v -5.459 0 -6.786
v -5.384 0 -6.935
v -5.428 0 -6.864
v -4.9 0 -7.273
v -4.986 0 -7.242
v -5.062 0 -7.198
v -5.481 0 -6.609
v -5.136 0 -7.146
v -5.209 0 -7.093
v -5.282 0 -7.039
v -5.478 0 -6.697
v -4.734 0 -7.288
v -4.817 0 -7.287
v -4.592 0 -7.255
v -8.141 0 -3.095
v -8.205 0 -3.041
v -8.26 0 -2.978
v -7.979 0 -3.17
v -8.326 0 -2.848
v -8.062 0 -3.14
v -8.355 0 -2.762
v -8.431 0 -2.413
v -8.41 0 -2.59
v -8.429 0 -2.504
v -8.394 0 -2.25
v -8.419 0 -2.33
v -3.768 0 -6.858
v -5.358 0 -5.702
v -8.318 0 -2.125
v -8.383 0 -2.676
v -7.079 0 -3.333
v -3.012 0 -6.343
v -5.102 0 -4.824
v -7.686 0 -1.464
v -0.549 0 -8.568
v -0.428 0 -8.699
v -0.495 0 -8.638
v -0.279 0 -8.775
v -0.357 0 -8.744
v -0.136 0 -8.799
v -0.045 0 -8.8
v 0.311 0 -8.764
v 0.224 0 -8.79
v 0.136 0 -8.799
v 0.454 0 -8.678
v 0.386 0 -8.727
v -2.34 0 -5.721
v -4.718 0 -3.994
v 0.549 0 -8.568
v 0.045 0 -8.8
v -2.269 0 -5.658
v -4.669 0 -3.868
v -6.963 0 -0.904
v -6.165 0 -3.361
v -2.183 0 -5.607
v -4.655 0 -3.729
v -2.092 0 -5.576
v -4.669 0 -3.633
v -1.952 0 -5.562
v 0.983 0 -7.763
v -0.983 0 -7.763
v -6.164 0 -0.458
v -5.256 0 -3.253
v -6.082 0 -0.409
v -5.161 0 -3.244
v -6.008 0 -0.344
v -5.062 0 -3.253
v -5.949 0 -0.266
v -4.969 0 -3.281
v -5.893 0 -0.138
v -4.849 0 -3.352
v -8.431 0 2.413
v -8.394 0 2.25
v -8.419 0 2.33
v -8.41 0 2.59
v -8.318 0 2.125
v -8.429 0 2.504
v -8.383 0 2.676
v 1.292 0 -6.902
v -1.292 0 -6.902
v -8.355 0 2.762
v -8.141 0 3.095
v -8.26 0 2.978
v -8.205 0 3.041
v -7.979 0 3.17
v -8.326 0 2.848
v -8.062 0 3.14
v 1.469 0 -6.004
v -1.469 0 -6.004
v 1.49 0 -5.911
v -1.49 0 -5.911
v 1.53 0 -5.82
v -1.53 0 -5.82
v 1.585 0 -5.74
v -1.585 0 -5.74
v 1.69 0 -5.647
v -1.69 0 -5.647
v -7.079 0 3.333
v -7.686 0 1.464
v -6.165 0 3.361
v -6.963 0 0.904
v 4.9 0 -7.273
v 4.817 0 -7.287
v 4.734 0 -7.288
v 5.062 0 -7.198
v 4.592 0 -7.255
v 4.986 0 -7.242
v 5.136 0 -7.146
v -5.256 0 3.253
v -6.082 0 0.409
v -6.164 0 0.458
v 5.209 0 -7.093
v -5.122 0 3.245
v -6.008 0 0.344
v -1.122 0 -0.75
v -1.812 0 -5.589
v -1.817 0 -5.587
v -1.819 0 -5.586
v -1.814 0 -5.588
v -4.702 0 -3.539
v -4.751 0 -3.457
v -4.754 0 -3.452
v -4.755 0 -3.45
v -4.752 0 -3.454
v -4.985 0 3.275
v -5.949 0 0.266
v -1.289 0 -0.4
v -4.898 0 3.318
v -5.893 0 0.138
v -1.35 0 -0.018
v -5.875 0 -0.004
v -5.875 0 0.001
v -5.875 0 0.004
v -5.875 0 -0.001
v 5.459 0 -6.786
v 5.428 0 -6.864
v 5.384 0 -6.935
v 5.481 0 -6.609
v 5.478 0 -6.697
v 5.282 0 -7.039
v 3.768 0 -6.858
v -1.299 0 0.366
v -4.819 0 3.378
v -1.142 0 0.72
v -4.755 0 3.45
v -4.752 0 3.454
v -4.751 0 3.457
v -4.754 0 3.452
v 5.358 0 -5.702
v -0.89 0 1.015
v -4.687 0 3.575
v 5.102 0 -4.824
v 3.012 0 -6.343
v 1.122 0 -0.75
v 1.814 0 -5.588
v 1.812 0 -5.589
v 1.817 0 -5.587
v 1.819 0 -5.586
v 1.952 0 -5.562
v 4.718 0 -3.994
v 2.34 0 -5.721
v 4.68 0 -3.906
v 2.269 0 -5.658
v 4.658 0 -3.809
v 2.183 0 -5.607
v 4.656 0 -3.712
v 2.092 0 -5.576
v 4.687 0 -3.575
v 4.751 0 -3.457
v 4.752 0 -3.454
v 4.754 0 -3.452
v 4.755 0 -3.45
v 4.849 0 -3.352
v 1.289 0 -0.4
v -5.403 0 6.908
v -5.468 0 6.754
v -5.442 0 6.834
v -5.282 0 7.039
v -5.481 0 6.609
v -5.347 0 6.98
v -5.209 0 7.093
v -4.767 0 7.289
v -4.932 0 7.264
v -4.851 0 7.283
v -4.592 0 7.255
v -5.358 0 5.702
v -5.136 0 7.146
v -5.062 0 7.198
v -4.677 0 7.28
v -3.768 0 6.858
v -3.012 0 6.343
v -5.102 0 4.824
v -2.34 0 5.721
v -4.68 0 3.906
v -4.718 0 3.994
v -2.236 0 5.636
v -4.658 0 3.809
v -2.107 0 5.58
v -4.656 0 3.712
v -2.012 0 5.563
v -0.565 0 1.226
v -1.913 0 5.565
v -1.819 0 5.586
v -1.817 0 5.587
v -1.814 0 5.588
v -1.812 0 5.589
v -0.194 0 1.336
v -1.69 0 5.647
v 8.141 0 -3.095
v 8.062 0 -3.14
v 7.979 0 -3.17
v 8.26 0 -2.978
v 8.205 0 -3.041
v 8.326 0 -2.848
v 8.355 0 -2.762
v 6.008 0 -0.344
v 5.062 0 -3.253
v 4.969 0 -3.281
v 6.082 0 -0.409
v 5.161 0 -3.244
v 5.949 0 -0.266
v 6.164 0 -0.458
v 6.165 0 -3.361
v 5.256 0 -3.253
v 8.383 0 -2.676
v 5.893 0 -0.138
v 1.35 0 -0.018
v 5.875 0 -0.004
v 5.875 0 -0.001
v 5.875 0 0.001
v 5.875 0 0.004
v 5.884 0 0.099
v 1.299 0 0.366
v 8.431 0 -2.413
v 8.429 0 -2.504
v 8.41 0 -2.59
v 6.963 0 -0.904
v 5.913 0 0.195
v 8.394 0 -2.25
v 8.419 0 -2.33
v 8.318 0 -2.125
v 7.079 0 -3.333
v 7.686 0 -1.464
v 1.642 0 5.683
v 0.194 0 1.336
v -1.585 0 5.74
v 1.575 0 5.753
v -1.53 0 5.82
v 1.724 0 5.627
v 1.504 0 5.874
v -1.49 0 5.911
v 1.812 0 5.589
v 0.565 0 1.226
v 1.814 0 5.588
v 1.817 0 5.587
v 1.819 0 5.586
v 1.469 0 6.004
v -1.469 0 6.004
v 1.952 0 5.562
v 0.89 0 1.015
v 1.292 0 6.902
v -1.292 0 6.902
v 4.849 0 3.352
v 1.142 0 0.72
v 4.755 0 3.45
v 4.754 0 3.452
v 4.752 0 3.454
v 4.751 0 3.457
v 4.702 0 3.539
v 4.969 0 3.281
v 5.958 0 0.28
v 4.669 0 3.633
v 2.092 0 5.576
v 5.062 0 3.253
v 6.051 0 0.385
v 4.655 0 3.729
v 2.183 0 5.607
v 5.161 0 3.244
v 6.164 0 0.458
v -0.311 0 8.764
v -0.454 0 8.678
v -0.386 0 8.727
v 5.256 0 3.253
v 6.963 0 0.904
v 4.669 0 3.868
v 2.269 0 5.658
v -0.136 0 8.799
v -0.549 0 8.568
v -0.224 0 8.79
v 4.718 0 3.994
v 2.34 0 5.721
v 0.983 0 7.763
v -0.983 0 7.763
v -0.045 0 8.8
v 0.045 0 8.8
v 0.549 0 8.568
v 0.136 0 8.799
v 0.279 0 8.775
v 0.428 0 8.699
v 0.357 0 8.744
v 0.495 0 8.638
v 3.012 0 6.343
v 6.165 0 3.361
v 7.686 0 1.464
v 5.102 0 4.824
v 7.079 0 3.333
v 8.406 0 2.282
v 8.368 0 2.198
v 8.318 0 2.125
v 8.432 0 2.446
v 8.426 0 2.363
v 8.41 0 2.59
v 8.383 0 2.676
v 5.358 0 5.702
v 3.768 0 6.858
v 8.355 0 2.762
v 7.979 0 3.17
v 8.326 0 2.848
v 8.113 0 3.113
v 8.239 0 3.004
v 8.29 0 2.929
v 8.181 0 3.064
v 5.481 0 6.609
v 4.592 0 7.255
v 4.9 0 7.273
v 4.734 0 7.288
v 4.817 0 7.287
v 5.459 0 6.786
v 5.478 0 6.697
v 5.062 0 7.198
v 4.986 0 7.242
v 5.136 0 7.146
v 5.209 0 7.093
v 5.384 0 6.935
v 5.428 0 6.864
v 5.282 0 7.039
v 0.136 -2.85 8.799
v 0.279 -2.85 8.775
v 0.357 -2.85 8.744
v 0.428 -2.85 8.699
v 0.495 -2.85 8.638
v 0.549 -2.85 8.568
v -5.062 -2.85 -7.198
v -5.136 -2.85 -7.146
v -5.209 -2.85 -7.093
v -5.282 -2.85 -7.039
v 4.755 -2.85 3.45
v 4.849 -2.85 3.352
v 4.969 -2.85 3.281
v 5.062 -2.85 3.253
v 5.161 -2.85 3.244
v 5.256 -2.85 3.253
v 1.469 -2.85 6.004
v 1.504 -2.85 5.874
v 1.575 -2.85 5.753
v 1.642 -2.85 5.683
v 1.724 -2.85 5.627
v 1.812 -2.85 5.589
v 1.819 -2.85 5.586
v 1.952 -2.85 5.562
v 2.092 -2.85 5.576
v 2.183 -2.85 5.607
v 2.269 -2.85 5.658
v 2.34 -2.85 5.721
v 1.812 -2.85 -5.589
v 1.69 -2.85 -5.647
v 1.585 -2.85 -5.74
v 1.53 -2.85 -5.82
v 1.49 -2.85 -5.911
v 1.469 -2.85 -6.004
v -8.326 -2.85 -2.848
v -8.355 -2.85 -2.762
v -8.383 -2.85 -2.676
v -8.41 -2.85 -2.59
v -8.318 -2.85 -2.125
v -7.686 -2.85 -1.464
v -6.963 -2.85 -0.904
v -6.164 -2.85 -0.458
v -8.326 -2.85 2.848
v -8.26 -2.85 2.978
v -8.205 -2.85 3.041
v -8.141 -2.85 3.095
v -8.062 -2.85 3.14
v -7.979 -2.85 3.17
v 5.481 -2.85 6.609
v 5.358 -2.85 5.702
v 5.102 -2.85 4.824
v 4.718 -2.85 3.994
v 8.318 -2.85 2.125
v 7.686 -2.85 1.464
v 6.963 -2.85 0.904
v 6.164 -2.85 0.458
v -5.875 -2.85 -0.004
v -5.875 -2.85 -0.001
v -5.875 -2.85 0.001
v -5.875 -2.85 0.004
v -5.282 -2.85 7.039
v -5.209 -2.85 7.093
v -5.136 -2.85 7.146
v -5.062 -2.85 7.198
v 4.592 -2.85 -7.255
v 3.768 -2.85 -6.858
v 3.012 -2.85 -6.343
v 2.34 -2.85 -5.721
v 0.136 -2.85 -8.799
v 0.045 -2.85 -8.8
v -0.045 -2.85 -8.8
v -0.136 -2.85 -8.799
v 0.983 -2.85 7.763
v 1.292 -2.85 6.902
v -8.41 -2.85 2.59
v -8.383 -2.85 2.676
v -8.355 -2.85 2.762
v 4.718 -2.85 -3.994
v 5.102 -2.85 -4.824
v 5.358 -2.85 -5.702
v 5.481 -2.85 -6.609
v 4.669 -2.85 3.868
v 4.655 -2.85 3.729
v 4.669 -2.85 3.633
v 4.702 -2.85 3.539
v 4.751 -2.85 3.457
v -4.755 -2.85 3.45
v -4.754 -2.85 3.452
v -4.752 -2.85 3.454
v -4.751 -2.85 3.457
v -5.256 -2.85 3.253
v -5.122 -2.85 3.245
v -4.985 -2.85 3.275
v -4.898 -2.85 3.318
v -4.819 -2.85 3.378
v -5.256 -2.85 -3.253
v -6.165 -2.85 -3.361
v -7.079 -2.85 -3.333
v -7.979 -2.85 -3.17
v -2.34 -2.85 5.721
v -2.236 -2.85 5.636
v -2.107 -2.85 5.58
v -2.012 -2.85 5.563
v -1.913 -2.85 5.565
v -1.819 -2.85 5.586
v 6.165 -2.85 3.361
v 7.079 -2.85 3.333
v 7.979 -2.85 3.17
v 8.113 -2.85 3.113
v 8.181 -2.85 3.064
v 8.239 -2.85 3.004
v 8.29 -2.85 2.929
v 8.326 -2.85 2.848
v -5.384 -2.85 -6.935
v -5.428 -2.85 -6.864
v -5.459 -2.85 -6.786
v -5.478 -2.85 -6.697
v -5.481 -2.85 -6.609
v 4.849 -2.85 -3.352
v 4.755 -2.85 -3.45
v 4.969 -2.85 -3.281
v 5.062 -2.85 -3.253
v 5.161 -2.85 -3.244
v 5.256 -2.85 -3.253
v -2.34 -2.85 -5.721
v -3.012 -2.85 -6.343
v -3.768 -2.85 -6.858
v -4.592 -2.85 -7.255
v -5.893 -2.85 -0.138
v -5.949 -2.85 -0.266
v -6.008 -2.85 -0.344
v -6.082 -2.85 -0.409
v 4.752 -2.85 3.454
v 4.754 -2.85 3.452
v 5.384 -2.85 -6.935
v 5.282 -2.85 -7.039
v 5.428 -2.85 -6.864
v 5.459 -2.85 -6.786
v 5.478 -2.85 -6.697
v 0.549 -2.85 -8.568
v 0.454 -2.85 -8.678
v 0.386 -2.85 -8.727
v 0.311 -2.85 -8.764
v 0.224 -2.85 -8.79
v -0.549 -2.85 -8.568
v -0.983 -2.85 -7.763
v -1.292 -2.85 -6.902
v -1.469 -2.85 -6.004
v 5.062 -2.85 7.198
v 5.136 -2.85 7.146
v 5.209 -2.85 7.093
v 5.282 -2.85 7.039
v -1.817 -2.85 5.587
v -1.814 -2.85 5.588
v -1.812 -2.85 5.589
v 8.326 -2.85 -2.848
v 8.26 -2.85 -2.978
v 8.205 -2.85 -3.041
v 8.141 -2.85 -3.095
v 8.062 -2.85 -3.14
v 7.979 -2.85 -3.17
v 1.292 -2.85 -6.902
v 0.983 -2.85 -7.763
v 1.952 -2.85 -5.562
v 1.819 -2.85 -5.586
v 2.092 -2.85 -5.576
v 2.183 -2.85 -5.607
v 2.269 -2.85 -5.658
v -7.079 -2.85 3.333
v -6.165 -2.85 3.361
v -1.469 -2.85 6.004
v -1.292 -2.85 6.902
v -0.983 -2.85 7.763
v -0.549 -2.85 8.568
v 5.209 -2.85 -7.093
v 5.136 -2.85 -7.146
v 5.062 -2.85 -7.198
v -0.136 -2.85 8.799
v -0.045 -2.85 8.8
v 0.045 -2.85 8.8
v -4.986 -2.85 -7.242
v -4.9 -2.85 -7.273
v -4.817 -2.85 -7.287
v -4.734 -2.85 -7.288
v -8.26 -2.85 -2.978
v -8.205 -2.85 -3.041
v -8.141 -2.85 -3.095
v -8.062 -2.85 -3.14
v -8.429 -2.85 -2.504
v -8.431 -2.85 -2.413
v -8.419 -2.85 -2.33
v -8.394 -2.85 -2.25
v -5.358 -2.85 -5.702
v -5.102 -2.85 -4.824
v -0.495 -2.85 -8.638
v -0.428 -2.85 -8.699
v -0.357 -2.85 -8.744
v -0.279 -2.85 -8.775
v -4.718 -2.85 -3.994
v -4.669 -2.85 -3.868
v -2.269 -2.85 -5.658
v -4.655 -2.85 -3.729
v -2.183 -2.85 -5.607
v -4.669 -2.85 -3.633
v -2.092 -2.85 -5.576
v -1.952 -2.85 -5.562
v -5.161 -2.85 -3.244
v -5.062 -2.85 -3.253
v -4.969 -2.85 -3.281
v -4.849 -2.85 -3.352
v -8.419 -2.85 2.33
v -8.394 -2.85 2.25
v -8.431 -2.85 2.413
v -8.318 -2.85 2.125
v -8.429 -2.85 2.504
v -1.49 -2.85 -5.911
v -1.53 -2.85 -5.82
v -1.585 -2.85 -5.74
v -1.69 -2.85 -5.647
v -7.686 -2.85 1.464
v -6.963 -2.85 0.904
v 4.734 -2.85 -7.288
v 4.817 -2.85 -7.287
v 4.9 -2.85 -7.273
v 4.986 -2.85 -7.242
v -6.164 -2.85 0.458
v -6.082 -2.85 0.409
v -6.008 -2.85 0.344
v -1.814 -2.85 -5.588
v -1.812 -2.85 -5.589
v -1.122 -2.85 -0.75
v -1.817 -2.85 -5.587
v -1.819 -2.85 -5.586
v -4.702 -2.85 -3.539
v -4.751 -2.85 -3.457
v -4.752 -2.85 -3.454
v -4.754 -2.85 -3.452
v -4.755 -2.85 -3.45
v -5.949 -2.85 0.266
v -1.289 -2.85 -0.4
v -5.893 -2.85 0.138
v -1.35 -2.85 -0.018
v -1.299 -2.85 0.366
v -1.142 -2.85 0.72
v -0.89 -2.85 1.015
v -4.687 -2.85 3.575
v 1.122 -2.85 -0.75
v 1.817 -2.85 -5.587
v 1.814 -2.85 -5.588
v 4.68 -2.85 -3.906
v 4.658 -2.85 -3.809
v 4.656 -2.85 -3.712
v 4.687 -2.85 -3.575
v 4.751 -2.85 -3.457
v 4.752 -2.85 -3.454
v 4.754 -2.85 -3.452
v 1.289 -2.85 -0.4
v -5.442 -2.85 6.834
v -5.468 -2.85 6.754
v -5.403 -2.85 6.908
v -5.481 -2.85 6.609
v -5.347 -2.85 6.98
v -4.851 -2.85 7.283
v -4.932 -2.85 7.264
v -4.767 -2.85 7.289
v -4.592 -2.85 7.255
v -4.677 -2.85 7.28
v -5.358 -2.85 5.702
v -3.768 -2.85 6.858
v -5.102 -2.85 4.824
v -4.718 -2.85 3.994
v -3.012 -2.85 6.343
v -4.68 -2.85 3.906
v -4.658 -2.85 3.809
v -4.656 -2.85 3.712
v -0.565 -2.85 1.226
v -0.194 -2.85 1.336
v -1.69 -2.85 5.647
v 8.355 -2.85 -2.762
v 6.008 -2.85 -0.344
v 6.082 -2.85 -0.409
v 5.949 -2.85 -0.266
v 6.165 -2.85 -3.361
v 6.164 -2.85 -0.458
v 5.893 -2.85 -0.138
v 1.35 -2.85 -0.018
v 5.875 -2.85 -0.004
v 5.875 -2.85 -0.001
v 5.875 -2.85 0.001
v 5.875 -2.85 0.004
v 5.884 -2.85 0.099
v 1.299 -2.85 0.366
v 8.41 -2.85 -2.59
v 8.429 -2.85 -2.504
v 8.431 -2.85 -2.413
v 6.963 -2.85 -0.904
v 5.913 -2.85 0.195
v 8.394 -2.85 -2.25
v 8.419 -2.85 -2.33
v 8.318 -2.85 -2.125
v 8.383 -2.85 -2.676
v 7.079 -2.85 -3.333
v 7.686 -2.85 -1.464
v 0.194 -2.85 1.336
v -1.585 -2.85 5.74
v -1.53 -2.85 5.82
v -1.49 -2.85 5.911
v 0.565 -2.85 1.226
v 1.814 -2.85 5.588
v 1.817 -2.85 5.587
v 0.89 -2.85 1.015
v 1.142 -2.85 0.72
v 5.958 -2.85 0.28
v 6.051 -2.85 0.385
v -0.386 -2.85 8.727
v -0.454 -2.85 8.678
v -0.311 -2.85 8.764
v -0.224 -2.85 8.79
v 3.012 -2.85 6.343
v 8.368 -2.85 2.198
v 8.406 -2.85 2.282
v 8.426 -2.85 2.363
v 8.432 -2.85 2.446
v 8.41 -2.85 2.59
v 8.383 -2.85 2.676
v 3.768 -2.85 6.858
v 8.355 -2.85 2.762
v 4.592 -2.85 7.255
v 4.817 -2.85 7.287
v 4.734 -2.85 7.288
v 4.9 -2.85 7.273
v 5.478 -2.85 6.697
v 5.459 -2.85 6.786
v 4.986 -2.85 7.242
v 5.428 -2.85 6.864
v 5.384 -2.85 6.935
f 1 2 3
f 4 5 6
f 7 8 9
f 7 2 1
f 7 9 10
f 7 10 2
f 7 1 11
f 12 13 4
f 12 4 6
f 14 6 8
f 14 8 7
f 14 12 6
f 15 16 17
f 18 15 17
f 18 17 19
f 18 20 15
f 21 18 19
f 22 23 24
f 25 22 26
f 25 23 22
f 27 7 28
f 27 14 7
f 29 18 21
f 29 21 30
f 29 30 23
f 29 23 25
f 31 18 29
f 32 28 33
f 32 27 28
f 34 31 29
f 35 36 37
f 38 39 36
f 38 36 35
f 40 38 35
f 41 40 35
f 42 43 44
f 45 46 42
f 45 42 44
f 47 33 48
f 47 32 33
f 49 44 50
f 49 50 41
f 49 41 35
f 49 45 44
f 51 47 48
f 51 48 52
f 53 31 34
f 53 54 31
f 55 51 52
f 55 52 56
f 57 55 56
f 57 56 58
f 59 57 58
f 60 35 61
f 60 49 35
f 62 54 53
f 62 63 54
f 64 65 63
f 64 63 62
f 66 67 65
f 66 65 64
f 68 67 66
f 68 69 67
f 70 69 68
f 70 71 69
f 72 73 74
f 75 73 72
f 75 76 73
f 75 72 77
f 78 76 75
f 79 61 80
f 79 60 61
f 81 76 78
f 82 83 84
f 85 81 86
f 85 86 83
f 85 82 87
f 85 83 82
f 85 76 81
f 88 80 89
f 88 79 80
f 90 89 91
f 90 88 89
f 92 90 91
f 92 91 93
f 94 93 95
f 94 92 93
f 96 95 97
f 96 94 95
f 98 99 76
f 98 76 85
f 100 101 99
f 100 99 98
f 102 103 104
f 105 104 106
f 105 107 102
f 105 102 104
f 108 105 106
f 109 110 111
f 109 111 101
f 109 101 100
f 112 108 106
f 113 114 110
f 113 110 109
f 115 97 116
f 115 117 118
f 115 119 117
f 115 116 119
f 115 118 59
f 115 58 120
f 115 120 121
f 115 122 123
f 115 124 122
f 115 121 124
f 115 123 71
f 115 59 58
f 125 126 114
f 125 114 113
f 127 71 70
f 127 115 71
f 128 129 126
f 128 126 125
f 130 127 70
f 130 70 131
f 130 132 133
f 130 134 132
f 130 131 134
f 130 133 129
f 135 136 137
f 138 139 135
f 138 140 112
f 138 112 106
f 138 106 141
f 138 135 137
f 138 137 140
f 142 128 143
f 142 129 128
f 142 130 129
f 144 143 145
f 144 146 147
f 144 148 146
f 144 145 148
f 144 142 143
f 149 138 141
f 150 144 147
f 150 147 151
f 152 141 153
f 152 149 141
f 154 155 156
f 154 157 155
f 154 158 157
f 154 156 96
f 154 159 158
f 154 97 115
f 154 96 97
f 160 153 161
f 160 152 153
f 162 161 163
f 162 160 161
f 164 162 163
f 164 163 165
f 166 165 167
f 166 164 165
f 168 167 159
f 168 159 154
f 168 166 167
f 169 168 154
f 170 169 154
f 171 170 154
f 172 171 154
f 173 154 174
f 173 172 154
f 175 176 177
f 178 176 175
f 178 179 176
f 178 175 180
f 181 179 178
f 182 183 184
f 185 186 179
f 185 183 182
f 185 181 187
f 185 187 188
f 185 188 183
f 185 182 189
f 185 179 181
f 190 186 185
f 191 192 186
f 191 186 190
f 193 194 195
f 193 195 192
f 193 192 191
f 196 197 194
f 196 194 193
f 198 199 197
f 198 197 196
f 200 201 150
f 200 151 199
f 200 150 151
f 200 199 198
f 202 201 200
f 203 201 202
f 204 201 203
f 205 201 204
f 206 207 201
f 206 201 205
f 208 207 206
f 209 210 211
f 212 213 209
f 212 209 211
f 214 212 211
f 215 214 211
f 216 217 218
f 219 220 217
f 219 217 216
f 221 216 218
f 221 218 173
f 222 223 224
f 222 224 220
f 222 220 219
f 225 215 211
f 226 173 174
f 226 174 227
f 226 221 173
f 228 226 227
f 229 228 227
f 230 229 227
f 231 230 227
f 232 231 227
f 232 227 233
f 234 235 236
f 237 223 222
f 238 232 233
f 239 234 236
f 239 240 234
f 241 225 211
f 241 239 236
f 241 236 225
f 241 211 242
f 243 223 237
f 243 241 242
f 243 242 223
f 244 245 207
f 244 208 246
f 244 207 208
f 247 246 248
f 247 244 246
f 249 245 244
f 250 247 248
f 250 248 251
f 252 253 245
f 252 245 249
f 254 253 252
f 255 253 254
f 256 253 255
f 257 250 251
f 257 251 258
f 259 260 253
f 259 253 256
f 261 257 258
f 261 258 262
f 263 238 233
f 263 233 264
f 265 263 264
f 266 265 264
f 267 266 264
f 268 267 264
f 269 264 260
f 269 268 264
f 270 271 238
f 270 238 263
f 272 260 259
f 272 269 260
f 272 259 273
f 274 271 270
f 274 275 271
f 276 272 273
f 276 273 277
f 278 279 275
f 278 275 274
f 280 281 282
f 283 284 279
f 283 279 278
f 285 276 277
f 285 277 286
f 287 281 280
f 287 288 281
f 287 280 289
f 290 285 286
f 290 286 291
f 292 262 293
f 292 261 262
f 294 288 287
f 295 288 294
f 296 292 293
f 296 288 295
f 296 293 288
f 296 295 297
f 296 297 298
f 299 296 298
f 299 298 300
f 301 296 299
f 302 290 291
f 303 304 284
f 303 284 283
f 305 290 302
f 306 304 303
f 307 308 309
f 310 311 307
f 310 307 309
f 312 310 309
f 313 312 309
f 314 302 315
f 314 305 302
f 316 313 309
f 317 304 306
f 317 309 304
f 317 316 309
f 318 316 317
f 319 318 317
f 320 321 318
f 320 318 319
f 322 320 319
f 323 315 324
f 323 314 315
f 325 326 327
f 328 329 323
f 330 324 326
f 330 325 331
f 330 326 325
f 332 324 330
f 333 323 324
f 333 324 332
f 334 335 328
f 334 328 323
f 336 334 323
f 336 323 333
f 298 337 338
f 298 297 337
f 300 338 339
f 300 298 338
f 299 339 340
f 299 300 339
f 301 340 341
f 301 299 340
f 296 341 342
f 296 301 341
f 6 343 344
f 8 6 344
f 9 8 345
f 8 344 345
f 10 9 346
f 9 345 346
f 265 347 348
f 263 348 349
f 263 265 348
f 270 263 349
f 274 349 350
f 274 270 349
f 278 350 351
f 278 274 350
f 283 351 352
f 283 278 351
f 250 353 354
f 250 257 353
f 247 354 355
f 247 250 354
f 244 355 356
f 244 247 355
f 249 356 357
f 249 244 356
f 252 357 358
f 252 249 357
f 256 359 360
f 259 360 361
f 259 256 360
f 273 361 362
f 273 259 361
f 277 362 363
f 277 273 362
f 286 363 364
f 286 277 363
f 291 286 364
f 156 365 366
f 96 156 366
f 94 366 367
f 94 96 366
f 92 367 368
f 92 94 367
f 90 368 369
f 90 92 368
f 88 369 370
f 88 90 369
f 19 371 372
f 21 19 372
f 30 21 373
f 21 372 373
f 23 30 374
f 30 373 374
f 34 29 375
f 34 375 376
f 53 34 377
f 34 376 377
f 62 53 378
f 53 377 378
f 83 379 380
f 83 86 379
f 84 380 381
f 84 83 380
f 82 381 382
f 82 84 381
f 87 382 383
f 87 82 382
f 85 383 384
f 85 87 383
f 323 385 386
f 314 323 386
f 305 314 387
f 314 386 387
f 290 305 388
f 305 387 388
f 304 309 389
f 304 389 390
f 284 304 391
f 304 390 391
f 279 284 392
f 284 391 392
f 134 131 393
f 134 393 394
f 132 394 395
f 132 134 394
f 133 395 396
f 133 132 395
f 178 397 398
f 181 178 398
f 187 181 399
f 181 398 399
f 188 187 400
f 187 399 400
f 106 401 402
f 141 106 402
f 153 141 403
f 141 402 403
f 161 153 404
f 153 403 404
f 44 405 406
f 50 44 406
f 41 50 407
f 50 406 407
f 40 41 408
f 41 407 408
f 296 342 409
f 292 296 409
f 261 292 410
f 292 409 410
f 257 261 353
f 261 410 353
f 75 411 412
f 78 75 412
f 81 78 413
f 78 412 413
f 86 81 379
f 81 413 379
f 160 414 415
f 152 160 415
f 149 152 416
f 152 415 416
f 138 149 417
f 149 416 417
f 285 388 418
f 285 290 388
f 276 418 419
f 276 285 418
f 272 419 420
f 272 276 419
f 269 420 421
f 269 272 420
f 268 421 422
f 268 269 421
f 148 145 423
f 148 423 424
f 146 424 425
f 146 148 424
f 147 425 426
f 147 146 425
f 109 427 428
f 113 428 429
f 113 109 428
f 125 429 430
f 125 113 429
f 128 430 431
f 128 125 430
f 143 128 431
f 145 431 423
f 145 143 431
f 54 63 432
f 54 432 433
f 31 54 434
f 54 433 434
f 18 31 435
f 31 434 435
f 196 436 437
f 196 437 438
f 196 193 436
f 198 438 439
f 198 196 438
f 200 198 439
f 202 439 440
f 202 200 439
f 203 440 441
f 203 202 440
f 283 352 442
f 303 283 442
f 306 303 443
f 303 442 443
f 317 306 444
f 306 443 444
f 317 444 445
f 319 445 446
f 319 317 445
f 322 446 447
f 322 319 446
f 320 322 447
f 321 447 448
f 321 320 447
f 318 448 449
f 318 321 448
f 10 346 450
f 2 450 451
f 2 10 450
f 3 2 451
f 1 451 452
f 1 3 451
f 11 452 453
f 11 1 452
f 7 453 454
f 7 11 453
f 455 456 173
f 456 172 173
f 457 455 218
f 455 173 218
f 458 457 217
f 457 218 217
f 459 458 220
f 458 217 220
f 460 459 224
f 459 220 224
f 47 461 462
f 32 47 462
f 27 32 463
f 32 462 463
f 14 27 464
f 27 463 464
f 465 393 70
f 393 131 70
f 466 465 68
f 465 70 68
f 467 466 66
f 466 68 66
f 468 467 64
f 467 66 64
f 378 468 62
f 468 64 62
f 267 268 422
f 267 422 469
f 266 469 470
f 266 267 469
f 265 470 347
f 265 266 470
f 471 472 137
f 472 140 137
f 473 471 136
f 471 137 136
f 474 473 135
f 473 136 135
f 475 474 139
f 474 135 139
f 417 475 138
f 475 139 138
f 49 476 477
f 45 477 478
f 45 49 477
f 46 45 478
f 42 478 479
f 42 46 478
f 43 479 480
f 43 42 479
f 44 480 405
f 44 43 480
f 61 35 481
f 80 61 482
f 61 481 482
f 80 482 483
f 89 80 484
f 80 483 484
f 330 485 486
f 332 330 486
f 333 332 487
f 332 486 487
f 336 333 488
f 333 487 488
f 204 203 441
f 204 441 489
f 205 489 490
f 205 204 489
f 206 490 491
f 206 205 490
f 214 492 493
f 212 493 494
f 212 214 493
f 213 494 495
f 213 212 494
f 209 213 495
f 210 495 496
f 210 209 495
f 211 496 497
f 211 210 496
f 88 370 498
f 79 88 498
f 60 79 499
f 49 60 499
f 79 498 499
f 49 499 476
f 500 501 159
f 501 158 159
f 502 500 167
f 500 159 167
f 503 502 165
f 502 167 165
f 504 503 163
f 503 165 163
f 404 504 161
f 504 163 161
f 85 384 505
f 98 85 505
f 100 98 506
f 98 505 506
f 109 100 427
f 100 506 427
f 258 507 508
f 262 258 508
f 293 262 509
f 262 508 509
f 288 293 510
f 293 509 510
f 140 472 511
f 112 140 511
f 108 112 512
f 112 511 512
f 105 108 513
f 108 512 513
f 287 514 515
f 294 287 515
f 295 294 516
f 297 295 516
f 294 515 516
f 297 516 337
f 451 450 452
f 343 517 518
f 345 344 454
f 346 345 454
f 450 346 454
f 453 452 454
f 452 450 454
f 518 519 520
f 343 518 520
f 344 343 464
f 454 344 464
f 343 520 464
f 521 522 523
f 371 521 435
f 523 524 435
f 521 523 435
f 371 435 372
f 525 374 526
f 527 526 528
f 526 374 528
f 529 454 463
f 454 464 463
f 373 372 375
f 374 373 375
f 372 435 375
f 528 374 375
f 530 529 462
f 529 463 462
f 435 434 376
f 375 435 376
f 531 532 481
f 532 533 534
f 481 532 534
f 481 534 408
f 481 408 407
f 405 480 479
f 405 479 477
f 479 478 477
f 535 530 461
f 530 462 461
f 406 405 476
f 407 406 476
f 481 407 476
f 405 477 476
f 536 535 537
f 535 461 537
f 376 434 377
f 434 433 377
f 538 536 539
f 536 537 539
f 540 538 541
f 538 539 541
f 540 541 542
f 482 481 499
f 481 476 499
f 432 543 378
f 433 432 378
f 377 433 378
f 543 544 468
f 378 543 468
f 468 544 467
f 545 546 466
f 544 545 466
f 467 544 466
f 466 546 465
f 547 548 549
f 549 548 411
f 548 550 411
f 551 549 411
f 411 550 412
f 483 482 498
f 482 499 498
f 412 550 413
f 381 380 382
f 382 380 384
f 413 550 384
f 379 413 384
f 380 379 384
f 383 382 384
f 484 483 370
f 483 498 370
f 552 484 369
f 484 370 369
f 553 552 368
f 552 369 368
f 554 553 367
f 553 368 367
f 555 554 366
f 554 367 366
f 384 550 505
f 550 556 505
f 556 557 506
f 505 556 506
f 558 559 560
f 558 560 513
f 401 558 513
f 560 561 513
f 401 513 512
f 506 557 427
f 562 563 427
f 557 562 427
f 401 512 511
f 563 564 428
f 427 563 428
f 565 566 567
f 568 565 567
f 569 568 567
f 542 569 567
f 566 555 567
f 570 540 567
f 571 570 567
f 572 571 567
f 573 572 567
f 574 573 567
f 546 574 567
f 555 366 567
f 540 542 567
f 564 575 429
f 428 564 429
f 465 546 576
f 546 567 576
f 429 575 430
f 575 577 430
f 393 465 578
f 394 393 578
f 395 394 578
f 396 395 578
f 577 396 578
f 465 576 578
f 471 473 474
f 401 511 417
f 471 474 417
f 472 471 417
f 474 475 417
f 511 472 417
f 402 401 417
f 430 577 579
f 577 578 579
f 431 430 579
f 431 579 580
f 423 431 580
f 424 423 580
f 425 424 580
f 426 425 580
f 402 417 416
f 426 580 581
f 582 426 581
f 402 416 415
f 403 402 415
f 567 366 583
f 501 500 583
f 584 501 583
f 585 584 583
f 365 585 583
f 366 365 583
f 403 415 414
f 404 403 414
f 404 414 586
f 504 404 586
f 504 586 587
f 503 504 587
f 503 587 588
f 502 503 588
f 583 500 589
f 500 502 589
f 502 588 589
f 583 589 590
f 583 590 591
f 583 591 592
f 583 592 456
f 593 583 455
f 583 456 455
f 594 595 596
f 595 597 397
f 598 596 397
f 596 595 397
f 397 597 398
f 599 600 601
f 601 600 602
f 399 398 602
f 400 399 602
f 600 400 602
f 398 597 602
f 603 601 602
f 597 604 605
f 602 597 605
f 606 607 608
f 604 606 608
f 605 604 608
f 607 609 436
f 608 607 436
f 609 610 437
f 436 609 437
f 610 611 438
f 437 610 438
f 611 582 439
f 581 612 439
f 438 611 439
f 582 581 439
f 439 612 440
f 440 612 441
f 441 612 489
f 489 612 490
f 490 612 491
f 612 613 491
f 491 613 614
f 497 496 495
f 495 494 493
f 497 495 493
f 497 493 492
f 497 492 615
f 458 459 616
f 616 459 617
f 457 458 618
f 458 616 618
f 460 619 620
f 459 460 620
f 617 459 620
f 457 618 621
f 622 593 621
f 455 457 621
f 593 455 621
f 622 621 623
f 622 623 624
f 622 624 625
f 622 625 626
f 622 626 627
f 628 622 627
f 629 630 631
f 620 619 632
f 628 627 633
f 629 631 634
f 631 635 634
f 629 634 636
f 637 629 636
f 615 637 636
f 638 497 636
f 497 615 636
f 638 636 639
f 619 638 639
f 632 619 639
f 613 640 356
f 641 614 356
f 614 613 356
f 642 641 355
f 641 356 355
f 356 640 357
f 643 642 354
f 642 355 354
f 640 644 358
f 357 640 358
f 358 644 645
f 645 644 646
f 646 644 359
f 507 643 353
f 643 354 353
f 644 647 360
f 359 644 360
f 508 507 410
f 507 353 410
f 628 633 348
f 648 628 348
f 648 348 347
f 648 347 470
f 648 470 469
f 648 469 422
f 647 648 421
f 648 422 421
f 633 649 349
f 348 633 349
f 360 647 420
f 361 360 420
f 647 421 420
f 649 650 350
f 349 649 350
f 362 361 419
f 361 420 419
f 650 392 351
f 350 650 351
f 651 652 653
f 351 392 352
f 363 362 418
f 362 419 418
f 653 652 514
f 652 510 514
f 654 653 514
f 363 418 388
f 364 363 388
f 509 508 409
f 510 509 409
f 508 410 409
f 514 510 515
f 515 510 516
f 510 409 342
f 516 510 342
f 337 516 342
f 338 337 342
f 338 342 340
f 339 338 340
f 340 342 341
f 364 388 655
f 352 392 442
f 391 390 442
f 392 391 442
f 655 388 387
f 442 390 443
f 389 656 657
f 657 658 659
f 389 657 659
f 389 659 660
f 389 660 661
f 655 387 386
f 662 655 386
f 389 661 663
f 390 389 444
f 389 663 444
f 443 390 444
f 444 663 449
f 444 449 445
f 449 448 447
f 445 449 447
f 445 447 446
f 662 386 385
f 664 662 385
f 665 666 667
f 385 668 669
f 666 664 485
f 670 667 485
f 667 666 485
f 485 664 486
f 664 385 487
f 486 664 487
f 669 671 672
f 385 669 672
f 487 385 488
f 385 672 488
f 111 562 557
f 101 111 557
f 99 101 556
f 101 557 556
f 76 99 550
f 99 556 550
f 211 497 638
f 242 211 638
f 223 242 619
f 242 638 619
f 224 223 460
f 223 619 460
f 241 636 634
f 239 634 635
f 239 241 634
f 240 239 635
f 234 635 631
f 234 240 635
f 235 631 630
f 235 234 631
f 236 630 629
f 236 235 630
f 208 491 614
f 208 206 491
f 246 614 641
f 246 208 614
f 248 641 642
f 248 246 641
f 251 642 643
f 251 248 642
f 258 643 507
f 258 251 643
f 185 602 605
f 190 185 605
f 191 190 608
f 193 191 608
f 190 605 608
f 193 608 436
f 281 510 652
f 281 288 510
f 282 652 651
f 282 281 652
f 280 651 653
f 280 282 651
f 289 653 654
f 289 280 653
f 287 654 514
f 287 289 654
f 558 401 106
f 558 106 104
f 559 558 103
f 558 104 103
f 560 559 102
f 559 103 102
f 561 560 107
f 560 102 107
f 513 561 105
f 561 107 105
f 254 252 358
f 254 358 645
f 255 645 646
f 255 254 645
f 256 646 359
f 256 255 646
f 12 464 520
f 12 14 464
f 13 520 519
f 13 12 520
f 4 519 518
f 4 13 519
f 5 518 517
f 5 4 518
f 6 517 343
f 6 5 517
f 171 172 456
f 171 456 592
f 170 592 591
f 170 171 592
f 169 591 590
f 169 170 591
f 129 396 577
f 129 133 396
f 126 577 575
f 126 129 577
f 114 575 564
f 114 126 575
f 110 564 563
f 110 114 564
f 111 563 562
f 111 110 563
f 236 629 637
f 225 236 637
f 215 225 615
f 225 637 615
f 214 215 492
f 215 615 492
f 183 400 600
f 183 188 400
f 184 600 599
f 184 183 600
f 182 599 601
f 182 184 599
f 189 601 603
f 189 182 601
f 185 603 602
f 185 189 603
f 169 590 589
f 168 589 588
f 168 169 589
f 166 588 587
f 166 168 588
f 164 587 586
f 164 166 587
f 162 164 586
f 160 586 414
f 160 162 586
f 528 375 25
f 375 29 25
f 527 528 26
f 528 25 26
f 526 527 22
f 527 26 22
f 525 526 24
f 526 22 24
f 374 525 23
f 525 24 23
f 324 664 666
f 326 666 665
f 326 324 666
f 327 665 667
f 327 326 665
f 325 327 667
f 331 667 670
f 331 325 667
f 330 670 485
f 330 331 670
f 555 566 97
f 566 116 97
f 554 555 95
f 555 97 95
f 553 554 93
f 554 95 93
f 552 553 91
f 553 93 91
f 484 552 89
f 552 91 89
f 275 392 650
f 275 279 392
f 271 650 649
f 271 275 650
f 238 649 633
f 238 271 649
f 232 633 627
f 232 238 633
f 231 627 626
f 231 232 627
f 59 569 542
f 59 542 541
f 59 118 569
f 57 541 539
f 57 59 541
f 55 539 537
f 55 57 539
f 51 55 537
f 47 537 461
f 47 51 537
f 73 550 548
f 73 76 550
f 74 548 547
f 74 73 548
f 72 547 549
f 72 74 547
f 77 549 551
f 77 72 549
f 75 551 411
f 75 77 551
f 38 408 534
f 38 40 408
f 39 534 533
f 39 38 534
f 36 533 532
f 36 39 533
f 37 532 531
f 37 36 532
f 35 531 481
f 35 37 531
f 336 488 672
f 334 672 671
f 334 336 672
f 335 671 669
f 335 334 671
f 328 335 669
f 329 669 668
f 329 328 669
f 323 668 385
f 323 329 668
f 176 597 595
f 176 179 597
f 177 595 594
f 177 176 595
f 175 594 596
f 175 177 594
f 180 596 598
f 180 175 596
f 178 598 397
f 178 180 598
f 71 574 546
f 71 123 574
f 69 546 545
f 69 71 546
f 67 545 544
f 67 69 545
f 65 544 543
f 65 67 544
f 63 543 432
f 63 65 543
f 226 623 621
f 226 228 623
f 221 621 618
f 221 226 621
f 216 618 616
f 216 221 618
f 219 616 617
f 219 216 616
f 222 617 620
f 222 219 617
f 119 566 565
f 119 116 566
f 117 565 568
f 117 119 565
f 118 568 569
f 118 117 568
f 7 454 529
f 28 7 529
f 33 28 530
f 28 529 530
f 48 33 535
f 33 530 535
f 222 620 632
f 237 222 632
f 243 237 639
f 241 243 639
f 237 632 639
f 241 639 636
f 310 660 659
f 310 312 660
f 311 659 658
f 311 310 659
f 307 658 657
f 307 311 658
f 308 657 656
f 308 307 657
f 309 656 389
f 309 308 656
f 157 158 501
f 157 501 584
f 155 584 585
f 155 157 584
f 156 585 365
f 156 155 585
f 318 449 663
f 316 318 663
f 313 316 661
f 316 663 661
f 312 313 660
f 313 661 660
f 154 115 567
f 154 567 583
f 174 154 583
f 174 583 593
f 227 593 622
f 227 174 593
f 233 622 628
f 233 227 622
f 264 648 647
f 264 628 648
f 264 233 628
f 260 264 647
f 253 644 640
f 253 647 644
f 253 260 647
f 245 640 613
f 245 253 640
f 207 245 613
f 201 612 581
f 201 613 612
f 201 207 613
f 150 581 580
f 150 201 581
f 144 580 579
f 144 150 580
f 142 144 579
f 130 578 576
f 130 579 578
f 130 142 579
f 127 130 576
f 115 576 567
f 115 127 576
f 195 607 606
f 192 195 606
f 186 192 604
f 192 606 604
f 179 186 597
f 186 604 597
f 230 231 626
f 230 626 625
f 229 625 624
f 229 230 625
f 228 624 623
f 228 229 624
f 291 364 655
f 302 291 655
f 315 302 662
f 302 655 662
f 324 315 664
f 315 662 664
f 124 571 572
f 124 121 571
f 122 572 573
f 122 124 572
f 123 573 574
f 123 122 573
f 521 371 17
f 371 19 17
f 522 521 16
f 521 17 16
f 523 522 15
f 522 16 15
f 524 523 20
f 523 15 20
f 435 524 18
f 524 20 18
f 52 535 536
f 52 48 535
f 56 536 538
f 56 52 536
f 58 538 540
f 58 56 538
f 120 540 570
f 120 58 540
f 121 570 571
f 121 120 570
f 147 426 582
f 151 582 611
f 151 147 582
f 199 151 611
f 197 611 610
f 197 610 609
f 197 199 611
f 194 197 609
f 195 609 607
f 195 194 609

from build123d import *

# Parameters (mm, degrees)
SKETCH1_R                = 5.875
BASE_FLANGE2_DEPTH       = 2.85
TAB1_START               = -2.85
TAB1_DEPTH               = 2.85
FILLET1_R                = 0.5
CIRPATTERN1_COUNT        = 10
FILLET1_OF_CIRPATTERN1_R = 0.5
CUT_EXTRUDE1_DEPTH       = 13.516657182


# Read off the part's stored shape, not the designer's step: Tab1
# Sheet-metal steps are written as plain solids
with BuildPart() as part:
    # Sketch1 → Base-Flange2 (new body)
    with BuildSketch(Plane(origin=(0, 0, 0), x_dir=(1, 0, 0), z_dir=(0, 1, 0))):
        with Locations(Location((0, 0, 0), (0, 0, 270))):
            Circle(SKETCH1_R)
    extrude(amount=-BASE_FLANGE2_DEPTH)

    # Tab1 outline → Tab1 (add)
    with BuildSketch(Plane(origin=(0, 0, 0), x_dir=(1, 0, 0), z_dir=(0, 1, 0)).offset(TAB1_START)):
        with BuildLine():
            ThreePointArc((0.4, 8.79090439), (0, 8.8), (-0.4, 8.79090439))
            ThreePointArc((-0.4, 8.79090439), (-1.1629301, 7.310892011), (-1.5, 5.680283884))
            ThreePointArc((-1.5, 5.680283884), (0, 5.875), (1.5, 5.680283884))
            ThreePointArc((1.5, 5.680283884), (1.1629301, 7.310892011), (0.4, 8.79090439))
        make_face()
    tab1 = extrude(amount=TAB1_DEPTH)

    # Fillet1
    fillet1_edges = [part.edges().sort_by_distance(p)[0] for p in [
        (-1.5, -1.425, -5.680283884),
        (-0.4, -1.425, -8.79090439),
        (0.4, -1.425, -8.79090439),
        (1.5, -1.425, -5.680283884),
    ]]
    fillet(fillet1_edges, radius=FILLET1_R)

    # CirPattern1: Tab1 ×10 about axis
    cirpattern1_axis = Axis((0, 0, 0), (0, 1, 0))
    for i in range(1, CIRPATTERN1_COUNT):
        add(tab1.rotate(cirpattern1_axis, i * 360 / CIRPATTERN1_COUNT))

    # Fillet1 of CirPattern1
    fillet1_of_cirpattern1_edges = [part.edges().sort_by_distance(p)[0] for p in [
        (-4.552312587, -1.425, -3.713768317),
        (-5.490770753, -1.425, -6.876876947),
        (-4.843557157, -1.425, -7.347105148),
        (-2.125261604, -1.425, -5.477124073),
        (-5.865796494, -1.425, -0.328719479),
        (-8.484253702, -1.425, -2.336116246),
        (-8.237040106, -1.425, -3.096961459),
        (-4.938745511, -1.425, -3.181889027),
        (-4.938745511, -1.425, 3.181889027),
        (-8.237040106, -1.425, 3.096961459),
        (-8.484253702, -1.425, 2.336116246),
        (-5.865796494, -1.425, 0.328719479),
        (-2.125261604, -1.425, 5.477124073),
        (-4.843557157, -1.425, 7.347105148),
        (-5.490770753, -1.425, 6.876876947),
        (-4.552312587, -1.425, 3.713768317),
        (1.5, -1.425, 5.680283884),
        (0.4, -1.425, 8.79090439),
        (-0.4, -1.425, 8.79090439),
        (-1.5, -1.425, 5.680283884),
        (4.552312587, -1.425, 3.713768317),
        (5.490770753, -1.425, 6.876876947),
        (4.843557157, -1.425, 7.347105148),
        (2.125261604, -1.425, 5.477124073),
        (5.865796494, -1.425, 0.328719479),
        (8.484253702, -1.425, 2.336116246),
        (8.237040106, -1.425, 3.096961459),
        (4.938745511, -1.425, 3.181889027),
        (4.938745511, -1.425, -3.181889027),
        (8.237040106, -1.425, -3.096961459),
        (8.484253702, -1.425, -2.336116246),
        (5.865796494, -1.425, -0.328719479),
        (2.125261604, -1.425, -5.477124073),
        (4.843557157, -1.425, -7.347105148),
        (5.490770753, -1.425, -6.876876947),
        (4.552312587, -1.425, -3.713768317),
    ]]
    fillet(fillet1_of_cirpattern1_edges, radius=FILLET1_OF_CIRPATTERN1_R)

    # Sketch11 → Cut-Extrude1 (cut, through all)
    with BuildSketch(Plane(origin=(0, 0, 0), x_dir=(1, 0, 0), z_dir=(0, 1, 0))):
        with BuildLine():
            Line((-1.122497216, 0.75), (1.122497216, 0.75))
            ThreePointArc((1.122497216, 0.75), (0, -1.35), (-1.122497216, 0.75))
        make_face()
    extrude(amount=-CUT_EXTRUDE1_DEPTH, mode=Mode.SUBTRACT)


solid = part.part
